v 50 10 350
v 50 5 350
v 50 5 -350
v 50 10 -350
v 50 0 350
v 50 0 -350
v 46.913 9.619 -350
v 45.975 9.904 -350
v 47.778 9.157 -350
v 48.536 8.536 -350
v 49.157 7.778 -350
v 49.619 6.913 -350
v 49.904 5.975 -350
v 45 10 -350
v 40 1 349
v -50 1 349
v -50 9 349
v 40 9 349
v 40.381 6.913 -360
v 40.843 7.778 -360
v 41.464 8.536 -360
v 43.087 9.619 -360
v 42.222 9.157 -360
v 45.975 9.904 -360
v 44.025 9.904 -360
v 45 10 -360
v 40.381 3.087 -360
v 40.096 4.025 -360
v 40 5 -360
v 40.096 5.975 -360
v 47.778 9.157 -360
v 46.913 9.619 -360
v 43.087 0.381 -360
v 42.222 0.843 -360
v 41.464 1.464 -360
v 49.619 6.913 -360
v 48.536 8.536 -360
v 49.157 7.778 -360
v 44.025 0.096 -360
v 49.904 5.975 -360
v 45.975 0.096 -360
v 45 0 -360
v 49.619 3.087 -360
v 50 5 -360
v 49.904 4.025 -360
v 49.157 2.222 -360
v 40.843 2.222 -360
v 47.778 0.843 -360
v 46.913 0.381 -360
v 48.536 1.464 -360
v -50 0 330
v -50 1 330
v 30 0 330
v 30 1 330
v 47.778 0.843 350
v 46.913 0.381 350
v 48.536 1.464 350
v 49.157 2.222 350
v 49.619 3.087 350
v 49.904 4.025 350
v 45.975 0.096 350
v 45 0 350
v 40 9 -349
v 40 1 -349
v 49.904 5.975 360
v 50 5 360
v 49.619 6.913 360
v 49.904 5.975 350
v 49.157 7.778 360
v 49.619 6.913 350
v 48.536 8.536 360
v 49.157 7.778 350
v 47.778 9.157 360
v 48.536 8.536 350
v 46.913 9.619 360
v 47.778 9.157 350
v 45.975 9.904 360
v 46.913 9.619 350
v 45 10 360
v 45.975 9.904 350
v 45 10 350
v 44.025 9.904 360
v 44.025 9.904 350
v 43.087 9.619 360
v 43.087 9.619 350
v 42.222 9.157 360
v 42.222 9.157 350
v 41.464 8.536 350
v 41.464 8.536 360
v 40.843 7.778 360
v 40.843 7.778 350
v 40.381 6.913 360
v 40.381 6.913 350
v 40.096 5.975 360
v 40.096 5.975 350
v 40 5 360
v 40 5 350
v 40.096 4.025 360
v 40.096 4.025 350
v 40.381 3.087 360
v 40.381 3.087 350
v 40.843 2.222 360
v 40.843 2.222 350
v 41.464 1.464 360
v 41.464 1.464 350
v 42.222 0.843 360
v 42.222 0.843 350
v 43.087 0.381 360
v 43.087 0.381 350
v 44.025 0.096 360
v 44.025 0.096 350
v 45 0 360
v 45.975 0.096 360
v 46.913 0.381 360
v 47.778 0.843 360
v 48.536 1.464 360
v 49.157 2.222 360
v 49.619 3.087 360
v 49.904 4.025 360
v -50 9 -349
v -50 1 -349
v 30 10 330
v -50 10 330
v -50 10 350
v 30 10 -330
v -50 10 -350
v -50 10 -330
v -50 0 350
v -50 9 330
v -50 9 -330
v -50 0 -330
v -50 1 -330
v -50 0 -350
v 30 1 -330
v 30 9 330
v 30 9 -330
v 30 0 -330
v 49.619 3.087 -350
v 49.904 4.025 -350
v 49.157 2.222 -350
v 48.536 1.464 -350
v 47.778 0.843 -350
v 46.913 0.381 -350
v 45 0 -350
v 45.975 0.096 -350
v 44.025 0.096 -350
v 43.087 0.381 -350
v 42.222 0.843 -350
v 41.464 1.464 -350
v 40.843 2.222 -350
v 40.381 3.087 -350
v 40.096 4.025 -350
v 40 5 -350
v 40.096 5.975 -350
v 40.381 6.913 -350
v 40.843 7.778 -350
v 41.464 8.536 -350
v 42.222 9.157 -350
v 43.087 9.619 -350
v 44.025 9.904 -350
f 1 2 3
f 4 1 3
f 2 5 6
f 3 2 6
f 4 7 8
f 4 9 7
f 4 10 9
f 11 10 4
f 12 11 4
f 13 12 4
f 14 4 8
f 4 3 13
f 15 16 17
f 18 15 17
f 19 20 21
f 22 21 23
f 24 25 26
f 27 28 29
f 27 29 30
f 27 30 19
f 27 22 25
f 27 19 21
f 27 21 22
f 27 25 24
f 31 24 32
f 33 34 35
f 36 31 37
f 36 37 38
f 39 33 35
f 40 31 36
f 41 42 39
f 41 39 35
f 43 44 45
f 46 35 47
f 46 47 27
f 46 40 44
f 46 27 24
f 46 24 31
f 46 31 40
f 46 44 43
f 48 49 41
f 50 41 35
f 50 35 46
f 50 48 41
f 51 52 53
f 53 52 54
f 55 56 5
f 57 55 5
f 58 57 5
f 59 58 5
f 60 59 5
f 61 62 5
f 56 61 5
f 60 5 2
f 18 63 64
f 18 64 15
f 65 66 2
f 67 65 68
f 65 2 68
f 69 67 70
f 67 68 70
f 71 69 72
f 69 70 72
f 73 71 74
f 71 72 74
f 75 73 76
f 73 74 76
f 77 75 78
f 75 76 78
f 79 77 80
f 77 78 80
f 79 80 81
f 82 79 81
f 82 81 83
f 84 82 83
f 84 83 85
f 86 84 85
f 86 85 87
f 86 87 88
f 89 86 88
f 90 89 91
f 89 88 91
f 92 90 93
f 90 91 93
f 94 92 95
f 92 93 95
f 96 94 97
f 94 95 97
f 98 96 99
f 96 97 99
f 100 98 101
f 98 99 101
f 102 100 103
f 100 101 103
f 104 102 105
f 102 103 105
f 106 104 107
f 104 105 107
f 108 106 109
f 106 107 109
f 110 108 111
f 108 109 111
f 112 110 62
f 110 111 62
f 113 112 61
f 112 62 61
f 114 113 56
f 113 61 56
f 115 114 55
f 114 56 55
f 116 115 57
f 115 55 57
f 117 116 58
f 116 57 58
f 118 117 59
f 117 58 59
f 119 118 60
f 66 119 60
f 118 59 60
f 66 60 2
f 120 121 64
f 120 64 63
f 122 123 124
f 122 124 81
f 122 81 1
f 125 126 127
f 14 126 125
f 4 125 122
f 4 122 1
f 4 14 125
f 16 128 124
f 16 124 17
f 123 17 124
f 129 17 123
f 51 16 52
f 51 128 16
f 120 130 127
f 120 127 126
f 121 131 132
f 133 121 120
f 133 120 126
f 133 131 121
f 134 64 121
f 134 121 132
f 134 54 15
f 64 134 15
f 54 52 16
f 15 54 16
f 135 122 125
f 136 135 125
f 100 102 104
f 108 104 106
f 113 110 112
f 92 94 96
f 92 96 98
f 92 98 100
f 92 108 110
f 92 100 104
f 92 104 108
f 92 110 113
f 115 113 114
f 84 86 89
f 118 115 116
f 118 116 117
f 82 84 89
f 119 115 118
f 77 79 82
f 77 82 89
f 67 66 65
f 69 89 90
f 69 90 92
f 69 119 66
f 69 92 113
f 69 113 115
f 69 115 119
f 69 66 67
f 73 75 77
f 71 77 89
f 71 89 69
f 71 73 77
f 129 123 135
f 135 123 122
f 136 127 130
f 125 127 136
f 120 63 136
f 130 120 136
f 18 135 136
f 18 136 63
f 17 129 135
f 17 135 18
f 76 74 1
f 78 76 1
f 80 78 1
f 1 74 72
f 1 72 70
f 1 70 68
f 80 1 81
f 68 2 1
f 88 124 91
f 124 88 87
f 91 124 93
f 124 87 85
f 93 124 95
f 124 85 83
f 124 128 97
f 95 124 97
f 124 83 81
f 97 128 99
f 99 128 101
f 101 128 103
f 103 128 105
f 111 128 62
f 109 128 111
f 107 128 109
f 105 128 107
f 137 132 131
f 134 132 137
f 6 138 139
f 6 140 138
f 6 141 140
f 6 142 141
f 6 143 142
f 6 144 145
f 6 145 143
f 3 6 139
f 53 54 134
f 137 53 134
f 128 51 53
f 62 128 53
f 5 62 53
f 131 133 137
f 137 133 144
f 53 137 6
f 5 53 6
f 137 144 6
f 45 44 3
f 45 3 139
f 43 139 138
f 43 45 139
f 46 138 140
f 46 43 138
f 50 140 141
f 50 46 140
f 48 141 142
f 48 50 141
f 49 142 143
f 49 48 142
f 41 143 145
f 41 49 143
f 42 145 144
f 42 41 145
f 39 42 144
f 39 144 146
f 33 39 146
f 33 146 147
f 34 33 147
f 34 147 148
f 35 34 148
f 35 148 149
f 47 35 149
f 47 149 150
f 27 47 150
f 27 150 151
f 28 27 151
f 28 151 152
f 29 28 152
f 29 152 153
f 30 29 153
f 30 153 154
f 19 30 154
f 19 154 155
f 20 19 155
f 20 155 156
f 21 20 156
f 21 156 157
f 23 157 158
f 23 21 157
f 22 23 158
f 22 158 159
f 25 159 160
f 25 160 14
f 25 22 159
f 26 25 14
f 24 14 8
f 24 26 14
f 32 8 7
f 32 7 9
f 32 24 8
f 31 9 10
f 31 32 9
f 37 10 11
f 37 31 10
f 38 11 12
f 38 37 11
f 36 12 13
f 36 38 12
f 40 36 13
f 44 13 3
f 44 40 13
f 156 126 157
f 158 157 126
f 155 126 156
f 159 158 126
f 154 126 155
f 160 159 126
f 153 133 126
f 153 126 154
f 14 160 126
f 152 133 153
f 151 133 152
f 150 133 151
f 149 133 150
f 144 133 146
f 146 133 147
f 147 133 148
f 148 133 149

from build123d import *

# Parameters (mm, degrees)
CROQUIS1_W              = 100
CROQUIS1_H              = 700
SALIENTE_EXTRUIR1_DEPTH = 10
CROQUIS2_R              = 5
SALIENTE_EXTRUIR2_DEPTH = 10
SALIENTE_EXTRUIR3_START = 10
CROQUIS3_R              = 5
SALIENTE_EXTRUIR3_DEPTH = 10
CROQUIS4_W              = 698
CROQUIS4_H              = 8
CORTAR_EXTRUIR1_DEPTH   = 90
CROQUIS5_W              = 80
CROQUIS5_H              = 660
CORTAR_EXTRUIR2_DEPTH   = 10


with BuildPart() as part:
    # Croquis1 → Saliente-Extruir1 (new body)
    with BuildSketch(Plane(origin=(0, 0, 0), x_dir=(1, 0, 0), z_dir=(0, 1, 0))):
        Rectangle(CROQUIS1_W, CROQUIS1_H)
    extrude(amount=SALIENTE_EXTRUIR1_DEPTH)

    # Croquis2 → Saliente-Extruir2 (add)
    with BuildSketch(Plane.XY.offset(350)):
        with Locations((45, 5)):
            Circle(CROQUIS2_R)
    extrude(amount=SALIENTE_EXTRUIR2_DEPTH)

    # Croquis3 → Saliente-Extruir3 (add)
    with BuildSketch(Plane(origin=(0, 0, -350), x_dir=(-1, 0, 0), z_dir=(0, 0, -1)).offset(SALIENTE_EXTRUIR3_START)):
        with Locations(Location((-45, 5, 0), (0, 0, 180))):
            Circle(CROQUIS3_R)
    extrude(amount=-SALIENTE_EXTRUIR3_DEPTH)

    # Croquis4 → Cortar-Extruir1 (cut)
    with BuildSketch(Plane.ZY.offset(50)):
        with Locations((0, 5)):
            Rectangle(CROQUIS4_W, CROQUIS4_H)
    extrude(amount=-CORTAR_EXTRUIR1_DEPTH, mode=Mode.SUBTRACT)

    # Croquis5 → Cortar-Extruir2 (cut)
    with BuildSketch(Plane(origin=(0, 10, 0), x_dir=(1, 0, 0), z_dir=(0, 1, 0))):
        with Locations((-10, 0)):
            Rectangle(CROQUIS5_W, CROQUIS5_H)
    extrude(amount=-CORTAR_EXTRUIR2_DEPTH, mode=Mode.SUBTRACT)


solid = part.part
